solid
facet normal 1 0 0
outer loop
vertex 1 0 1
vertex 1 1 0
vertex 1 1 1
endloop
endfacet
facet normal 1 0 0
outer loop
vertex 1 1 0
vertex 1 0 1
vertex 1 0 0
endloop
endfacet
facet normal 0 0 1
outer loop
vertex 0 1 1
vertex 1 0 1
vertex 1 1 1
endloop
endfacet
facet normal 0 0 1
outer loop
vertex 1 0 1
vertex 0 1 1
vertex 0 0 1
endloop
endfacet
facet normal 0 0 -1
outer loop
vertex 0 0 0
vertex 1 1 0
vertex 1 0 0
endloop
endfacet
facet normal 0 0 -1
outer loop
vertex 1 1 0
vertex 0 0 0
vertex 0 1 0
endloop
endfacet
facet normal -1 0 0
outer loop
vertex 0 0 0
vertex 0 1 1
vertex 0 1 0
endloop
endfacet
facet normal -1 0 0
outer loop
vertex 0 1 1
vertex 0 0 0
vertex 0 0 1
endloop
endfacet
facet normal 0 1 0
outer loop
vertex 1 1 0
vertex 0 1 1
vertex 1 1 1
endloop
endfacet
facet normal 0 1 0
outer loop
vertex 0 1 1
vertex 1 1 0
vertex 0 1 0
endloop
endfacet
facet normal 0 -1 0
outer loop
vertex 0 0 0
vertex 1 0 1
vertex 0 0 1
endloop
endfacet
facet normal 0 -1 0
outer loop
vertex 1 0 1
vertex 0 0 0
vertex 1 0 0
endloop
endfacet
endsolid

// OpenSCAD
intersection() {
    minkowski() {
        intersection() {
            translate([-2,0,0]) cube(1);
            translate([2,0,0]) cube(1);
        }
        cube();
    }
    cube();
}
